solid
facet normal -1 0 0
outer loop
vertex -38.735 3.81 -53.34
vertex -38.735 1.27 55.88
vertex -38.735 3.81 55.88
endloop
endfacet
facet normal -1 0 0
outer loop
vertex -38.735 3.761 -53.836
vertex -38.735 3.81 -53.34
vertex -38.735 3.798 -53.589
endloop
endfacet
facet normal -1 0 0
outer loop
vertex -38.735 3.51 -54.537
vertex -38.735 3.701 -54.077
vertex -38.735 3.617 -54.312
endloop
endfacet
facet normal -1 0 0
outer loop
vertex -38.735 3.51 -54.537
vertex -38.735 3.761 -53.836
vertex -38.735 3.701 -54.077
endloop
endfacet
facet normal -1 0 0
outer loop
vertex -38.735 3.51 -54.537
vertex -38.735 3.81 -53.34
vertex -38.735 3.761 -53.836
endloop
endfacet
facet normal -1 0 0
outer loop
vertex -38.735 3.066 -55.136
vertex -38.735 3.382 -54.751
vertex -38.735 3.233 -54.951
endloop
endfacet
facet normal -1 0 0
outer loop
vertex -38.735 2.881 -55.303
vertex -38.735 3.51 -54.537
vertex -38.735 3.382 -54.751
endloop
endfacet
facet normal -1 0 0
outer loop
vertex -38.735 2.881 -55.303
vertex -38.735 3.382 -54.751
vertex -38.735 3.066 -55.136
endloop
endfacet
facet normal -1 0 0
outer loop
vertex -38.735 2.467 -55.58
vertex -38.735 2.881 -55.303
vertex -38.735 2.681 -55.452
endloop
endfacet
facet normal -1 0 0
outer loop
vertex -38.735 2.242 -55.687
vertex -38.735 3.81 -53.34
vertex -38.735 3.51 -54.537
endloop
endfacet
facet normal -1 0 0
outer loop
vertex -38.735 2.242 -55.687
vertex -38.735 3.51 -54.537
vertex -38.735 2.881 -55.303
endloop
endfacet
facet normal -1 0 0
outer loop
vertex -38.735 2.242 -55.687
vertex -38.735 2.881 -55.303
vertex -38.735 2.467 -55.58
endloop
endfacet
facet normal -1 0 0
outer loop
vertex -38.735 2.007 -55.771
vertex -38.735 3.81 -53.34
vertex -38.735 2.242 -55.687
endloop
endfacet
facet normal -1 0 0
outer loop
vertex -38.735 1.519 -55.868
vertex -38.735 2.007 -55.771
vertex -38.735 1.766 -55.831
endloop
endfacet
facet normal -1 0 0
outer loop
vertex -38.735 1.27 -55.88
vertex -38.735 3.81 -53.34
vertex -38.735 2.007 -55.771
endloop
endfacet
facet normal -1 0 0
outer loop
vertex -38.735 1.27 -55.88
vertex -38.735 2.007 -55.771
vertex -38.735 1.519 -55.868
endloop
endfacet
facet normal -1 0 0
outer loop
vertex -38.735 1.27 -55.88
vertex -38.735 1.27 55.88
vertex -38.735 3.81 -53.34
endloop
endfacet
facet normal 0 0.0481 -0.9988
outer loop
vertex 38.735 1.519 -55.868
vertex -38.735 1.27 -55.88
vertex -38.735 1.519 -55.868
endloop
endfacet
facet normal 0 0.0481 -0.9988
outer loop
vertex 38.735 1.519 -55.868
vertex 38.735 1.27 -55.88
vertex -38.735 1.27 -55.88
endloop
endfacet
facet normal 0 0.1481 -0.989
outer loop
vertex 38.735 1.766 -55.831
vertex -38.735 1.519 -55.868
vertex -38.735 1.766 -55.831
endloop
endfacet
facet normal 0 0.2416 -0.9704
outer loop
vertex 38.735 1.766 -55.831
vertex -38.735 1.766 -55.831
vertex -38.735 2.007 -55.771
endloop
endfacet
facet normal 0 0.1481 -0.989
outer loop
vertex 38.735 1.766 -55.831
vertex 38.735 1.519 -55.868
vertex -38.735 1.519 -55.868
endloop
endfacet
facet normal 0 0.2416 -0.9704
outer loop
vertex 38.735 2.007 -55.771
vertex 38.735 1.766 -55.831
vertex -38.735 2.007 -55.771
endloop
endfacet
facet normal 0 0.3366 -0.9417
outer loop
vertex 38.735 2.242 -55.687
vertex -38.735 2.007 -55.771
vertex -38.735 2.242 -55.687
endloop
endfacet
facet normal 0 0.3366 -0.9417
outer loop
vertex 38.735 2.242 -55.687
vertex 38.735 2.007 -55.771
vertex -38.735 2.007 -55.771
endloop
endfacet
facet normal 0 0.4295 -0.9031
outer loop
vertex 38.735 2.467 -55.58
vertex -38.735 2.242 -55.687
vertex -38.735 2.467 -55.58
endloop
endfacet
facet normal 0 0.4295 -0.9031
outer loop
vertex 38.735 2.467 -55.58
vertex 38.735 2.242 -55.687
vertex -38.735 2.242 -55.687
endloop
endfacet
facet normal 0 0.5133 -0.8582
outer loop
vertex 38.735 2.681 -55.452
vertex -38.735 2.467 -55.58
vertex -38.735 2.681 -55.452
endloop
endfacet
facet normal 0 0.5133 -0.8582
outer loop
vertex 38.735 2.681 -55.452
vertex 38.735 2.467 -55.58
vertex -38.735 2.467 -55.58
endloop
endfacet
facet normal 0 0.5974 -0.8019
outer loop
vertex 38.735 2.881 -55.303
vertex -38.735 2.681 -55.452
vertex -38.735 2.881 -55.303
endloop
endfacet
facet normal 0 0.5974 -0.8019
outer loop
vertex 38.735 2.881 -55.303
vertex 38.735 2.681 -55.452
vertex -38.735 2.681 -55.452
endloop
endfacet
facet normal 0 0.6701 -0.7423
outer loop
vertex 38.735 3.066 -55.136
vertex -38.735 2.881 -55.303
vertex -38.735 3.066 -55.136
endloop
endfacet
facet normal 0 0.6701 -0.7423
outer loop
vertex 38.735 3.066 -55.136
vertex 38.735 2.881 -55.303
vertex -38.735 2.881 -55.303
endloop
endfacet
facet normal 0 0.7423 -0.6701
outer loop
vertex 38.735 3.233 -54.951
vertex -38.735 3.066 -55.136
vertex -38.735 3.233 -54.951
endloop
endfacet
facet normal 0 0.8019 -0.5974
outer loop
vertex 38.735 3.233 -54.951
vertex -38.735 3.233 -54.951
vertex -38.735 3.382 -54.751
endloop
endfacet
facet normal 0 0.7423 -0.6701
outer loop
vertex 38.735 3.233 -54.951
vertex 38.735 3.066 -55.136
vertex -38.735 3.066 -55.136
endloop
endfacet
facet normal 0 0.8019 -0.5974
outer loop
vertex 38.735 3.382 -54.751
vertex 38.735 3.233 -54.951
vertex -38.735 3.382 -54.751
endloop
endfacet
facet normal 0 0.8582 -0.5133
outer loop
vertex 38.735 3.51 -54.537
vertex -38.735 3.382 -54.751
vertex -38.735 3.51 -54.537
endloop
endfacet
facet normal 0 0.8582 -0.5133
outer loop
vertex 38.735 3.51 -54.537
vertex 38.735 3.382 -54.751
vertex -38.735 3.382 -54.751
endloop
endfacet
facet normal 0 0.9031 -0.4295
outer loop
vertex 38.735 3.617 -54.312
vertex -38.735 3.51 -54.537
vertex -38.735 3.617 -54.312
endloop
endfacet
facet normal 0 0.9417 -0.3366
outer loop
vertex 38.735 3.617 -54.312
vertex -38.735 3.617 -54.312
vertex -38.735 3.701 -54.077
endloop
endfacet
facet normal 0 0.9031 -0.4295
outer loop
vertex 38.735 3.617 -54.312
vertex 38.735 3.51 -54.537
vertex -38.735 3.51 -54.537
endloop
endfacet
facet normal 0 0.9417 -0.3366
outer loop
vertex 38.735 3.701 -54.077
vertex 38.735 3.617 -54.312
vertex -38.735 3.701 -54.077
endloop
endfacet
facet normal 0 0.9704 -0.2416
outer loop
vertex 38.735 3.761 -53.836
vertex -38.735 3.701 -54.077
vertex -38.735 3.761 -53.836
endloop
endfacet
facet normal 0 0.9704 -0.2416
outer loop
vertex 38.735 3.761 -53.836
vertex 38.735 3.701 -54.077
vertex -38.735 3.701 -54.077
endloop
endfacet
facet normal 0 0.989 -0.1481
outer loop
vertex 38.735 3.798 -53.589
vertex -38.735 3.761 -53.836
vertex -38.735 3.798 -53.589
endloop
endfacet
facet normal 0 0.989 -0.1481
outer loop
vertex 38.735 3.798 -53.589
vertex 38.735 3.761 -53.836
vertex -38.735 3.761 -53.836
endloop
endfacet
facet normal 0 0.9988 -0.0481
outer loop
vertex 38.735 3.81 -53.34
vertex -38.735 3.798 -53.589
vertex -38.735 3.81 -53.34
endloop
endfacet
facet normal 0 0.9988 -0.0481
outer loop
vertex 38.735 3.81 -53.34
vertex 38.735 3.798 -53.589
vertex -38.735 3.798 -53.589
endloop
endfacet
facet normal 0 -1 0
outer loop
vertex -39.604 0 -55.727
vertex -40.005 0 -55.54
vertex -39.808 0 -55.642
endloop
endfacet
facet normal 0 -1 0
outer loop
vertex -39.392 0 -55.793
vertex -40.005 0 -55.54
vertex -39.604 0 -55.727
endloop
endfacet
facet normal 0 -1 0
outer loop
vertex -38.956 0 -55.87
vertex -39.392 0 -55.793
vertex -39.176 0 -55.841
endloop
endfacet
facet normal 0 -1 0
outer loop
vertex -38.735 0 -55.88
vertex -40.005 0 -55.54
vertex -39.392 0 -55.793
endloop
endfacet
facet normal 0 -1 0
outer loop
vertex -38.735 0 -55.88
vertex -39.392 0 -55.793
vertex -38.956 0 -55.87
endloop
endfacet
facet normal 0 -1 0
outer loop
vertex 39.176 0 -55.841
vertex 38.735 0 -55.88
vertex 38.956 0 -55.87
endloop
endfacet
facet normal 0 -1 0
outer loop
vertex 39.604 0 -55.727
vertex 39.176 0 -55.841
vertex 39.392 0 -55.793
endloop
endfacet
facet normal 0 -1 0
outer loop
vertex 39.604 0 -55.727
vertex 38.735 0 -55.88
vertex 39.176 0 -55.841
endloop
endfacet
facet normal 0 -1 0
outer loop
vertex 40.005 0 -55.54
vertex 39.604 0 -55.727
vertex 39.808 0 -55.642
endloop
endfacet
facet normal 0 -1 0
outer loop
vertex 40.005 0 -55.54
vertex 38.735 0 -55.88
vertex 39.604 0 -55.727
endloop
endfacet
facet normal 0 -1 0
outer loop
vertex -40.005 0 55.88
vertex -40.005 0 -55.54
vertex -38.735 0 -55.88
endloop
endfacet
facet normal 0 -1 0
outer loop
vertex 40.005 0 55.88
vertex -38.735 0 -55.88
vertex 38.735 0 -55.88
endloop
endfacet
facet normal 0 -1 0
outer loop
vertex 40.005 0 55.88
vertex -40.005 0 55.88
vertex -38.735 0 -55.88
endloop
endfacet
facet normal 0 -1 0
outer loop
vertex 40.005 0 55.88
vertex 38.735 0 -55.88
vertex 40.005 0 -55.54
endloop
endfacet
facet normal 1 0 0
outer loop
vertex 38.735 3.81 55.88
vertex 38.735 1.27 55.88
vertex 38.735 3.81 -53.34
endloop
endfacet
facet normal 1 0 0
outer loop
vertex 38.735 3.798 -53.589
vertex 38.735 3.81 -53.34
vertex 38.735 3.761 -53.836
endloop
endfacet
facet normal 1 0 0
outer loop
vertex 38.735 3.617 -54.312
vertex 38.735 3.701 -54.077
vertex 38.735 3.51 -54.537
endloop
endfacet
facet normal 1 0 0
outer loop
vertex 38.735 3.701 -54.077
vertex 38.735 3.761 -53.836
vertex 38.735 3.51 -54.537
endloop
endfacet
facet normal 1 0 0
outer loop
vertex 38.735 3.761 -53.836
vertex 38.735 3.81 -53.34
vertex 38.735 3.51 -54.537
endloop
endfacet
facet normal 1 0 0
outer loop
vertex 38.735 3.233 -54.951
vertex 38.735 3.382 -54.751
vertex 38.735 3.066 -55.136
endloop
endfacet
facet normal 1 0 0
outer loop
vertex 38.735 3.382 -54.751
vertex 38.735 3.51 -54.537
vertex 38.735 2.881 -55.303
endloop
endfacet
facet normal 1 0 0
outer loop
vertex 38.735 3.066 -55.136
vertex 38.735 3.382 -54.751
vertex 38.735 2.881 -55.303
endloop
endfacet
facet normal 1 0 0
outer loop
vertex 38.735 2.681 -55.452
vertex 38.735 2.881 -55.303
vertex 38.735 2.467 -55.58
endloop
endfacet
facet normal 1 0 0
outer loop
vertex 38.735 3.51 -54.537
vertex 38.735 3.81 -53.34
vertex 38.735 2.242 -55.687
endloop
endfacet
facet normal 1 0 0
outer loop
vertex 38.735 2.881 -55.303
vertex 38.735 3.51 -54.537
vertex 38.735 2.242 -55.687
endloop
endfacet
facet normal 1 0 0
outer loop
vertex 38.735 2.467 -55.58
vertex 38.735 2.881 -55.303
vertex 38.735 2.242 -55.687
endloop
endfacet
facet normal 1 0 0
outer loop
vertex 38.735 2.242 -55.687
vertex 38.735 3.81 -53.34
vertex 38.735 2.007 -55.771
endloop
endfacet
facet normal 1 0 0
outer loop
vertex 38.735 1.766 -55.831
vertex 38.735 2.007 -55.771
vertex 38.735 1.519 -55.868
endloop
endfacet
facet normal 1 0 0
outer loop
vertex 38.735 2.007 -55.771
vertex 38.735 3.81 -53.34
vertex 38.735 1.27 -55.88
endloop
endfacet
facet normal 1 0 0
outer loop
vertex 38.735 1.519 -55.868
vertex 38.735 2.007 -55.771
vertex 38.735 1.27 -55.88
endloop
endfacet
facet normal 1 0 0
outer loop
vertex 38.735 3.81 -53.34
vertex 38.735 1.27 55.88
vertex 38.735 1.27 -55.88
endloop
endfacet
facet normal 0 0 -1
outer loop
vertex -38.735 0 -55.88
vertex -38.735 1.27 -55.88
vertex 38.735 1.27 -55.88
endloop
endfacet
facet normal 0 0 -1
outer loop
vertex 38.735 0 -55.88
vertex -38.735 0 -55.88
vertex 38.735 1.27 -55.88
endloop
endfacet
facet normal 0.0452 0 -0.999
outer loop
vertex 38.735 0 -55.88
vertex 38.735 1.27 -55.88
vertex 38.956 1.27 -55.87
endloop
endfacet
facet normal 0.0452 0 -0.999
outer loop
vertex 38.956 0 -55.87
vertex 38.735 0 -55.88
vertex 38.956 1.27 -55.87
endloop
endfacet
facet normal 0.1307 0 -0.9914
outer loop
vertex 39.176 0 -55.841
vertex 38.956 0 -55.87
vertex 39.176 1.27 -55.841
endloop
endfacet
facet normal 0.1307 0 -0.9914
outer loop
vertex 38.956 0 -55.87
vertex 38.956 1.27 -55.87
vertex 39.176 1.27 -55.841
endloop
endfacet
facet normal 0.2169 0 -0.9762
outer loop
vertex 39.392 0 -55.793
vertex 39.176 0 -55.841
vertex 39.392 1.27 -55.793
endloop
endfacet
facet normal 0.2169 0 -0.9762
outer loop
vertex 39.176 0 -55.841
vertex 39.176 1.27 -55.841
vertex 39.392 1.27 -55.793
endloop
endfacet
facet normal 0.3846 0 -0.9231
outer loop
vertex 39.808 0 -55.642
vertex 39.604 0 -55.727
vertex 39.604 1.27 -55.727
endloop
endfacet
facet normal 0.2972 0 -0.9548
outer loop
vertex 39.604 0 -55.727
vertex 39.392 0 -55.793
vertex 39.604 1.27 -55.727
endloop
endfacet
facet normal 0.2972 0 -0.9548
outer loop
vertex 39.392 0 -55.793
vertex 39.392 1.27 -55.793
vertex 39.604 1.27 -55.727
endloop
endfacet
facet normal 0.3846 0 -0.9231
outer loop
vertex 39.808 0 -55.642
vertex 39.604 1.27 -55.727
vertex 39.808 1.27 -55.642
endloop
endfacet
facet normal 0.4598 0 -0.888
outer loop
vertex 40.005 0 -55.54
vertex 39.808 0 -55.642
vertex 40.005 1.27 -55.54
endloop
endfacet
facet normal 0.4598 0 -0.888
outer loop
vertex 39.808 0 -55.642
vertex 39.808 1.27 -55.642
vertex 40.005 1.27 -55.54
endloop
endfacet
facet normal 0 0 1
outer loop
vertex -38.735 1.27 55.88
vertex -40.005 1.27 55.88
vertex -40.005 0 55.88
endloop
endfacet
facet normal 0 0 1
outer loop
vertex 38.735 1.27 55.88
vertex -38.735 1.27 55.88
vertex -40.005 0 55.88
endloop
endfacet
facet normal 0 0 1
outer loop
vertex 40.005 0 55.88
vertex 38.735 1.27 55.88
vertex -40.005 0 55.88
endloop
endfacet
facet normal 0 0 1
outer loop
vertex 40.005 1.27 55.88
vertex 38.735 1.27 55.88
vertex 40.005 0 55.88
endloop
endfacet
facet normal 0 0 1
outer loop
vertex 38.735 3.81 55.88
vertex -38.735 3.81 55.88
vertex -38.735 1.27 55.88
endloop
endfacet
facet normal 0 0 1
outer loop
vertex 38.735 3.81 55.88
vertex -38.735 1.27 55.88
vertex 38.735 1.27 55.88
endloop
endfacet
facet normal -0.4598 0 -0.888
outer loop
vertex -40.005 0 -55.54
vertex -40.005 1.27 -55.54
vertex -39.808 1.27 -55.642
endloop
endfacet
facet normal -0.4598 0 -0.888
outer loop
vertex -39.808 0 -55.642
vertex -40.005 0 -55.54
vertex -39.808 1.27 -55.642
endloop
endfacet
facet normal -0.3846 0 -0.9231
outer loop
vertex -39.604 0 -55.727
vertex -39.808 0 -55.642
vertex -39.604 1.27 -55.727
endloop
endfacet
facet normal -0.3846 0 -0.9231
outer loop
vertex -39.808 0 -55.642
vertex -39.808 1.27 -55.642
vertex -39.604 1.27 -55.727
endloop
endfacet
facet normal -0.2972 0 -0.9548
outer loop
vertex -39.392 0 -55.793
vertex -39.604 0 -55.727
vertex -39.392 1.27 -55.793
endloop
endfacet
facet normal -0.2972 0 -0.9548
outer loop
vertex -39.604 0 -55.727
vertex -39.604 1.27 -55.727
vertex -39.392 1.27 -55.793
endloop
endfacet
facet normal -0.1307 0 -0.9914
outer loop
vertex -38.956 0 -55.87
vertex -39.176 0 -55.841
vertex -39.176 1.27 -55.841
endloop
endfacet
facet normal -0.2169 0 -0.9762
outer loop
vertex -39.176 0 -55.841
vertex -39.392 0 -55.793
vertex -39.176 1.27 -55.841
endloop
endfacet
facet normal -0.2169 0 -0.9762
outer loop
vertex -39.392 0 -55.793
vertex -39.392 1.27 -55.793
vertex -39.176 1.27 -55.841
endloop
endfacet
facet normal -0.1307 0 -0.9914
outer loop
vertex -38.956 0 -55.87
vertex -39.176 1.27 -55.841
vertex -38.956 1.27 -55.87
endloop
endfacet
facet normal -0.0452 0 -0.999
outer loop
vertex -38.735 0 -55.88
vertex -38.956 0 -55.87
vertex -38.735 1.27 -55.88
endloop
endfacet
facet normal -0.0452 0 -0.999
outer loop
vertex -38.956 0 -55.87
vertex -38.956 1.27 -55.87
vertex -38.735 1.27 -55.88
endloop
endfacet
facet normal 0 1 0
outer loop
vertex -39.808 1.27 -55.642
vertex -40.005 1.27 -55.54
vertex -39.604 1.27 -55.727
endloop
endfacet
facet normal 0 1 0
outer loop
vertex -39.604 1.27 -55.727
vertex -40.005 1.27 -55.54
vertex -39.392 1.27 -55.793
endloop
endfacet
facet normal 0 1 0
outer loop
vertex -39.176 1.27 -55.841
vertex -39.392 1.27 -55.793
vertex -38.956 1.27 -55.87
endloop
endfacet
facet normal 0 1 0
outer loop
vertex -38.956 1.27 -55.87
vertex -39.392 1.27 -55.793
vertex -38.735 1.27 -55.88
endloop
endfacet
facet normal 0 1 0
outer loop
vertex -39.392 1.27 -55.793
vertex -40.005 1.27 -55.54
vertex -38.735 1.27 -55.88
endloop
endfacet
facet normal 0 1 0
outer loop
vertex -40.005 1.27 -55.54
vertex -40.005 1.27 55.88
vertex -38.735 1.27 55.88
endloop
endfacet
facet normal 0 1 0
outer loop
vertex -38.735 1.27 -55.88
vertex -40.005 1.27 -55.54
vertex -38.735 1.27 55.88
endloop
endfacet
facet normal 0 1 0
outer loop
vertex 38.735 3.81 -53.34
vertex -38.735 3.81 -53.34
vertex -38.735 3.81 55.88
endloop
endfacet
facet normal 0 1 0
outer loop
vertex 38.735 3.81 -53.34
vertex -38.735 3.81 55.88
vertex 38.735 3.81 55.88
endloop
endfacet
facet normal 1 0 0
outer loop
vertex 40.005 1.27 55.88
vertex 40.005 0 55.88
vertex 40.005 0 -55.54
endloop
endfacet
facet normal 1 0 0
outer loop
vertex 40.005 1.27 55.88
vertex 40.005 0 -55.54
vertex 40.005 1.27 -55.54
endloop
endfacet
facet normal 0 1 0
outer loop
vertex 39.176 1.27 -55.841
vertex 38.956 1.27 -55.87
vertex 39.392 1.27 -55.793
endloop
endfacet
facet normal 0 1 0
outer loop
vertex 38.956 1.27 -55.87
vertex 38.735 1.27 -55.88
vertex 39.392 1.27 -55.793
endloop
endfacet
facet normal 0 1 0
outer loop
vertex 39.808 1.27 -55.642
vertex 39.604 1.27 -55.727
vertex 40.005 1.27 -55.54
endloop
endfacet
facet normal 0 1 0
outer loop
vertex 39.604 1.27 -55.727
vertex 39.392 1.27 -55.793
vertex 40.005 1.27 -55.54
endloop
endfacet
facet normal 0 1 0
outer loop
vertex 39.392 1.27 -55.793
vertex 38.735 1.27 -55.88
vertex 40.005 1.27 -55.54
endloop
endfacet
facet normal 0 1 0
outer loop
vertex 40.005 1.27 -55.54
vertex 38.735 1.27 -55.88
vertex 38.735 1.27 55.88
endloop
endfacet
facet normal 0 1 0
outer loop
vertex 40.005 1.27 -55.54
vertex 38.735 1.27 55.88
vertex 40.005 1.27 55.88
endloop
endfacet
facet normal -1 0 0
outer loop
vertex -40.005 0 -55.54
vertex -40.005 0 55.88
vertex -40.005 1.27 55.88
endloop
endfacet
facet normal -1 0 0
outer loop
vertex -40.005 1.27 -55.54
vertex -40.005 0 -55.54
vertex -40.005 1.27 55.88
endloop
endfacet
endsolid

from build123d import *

# Parameters (mm, degrees)
SKETCH2_W           = 77.47
SKETCH2_H           = 111.76
BOSS_EXTRUDE1_DEPTH = 3.81
SKETCH3_W           = 1.27
SKETCH3_H           = 1.27
BOSS_EXTRUDE2_DEPTH = 111.76
FILLET1_R           = 2.54
CUT_EXTRUDE1_REACH  = 70.829


with BuildPart() as part:
    # Sketch2 → Boss-Extrude1 (new body)
    with BuildSketch(Plane(origin=(0, 0, 0), x_dir=(1, 0, 0), z_dir=(0, 1, 0))):
        Rectangle(SKETCH2_W, SKETCH2_H)
    extrude(amount=BOSS_EXTRUDE1_DEPTH)

    # Sketch3 → Boss-Extrude2 (add)
    with BuildSketch(Plane.XY.offset(55.88)):
        with Locations((-39.37, 0.635)):
            Rectangle(SKETCH3_W, SKETCH3_H)
        with Locations((39.37, 0.635)):
            Rectangle(SKETCH3_W, SKETCH3_H)
    extrude(amount=-BOSS_EXTRUDE2_DEPTH)

    # Fillet1
    fillet1_edges = [part.edges().sort_by_distance(p)[0] for p in [
        (0, 3.81, -55.88),
    ]]
    fillet(fillet1_edges, radius=FILLET1_R)

    # Sketch5 → Cut-Extrude1 (cut, up to next)
    with BuildSketch(Plane(origin=(0, 3.81, 0), x_dir=(1, 0, 0), z_dir=(0, 1, 0)), mode=Mode.PRIVATE) as cut_extrude1_sk1:
        with BuildLine():
            Line((40.005, 55.539704526), (40.005, 55.88))
            Line((40.005, 55.88), (38.735, 55.88))
            ThreePointArc((38.735, 55.88), (39.392400375, 55.793451599), (40.005, 55.539704526))
        make_face()
    cut_extrude1_tool1 = extrude(cut_extrude1_sk1.sketch, amount=-CUT_EXTRUDE1_REACH, mode=Mode.PRIVATE) & part.part
    # Sketch5 → Cut-Extrude1 (cut, up to next)
    with BuildSketch(Plane(origin=(0, 3.81, 0), x_dir=(1, 0, 0), z_dir=(0, 1, 0)), mode=Mode.PRIVATE) as cut_extrude1_sk2:
        with BuildLine():
            ThreePointArc((-40.005, 55.539704526), (-39.392400375, 55.793451599), (-38.735, 55.88))
            Line((-38.735, 55.88), (-40.005, 55.88))
            Line((-40.005, 55.88), (-40.005, 55.539704526))
        make_face()
    cut_extrude1_tool2 = extrude(cut_extrude1_sk2.sketch, amount=-CUT_EXTRUDE1_REACH, mode=Mode.PRIVATE) & part.part
    add(cut_extrude1_tool1.solids().sort_by_distance((39.69191, 3.81, -55.779201))[0], mode=Mode.SUBTRACT)
    add(cut_extrude1_tool2.solids().sort_by_distance((-39.69191, 3.81, -55.779201))[0], mode=Mode.SUBTRACT)


solid = part.part
